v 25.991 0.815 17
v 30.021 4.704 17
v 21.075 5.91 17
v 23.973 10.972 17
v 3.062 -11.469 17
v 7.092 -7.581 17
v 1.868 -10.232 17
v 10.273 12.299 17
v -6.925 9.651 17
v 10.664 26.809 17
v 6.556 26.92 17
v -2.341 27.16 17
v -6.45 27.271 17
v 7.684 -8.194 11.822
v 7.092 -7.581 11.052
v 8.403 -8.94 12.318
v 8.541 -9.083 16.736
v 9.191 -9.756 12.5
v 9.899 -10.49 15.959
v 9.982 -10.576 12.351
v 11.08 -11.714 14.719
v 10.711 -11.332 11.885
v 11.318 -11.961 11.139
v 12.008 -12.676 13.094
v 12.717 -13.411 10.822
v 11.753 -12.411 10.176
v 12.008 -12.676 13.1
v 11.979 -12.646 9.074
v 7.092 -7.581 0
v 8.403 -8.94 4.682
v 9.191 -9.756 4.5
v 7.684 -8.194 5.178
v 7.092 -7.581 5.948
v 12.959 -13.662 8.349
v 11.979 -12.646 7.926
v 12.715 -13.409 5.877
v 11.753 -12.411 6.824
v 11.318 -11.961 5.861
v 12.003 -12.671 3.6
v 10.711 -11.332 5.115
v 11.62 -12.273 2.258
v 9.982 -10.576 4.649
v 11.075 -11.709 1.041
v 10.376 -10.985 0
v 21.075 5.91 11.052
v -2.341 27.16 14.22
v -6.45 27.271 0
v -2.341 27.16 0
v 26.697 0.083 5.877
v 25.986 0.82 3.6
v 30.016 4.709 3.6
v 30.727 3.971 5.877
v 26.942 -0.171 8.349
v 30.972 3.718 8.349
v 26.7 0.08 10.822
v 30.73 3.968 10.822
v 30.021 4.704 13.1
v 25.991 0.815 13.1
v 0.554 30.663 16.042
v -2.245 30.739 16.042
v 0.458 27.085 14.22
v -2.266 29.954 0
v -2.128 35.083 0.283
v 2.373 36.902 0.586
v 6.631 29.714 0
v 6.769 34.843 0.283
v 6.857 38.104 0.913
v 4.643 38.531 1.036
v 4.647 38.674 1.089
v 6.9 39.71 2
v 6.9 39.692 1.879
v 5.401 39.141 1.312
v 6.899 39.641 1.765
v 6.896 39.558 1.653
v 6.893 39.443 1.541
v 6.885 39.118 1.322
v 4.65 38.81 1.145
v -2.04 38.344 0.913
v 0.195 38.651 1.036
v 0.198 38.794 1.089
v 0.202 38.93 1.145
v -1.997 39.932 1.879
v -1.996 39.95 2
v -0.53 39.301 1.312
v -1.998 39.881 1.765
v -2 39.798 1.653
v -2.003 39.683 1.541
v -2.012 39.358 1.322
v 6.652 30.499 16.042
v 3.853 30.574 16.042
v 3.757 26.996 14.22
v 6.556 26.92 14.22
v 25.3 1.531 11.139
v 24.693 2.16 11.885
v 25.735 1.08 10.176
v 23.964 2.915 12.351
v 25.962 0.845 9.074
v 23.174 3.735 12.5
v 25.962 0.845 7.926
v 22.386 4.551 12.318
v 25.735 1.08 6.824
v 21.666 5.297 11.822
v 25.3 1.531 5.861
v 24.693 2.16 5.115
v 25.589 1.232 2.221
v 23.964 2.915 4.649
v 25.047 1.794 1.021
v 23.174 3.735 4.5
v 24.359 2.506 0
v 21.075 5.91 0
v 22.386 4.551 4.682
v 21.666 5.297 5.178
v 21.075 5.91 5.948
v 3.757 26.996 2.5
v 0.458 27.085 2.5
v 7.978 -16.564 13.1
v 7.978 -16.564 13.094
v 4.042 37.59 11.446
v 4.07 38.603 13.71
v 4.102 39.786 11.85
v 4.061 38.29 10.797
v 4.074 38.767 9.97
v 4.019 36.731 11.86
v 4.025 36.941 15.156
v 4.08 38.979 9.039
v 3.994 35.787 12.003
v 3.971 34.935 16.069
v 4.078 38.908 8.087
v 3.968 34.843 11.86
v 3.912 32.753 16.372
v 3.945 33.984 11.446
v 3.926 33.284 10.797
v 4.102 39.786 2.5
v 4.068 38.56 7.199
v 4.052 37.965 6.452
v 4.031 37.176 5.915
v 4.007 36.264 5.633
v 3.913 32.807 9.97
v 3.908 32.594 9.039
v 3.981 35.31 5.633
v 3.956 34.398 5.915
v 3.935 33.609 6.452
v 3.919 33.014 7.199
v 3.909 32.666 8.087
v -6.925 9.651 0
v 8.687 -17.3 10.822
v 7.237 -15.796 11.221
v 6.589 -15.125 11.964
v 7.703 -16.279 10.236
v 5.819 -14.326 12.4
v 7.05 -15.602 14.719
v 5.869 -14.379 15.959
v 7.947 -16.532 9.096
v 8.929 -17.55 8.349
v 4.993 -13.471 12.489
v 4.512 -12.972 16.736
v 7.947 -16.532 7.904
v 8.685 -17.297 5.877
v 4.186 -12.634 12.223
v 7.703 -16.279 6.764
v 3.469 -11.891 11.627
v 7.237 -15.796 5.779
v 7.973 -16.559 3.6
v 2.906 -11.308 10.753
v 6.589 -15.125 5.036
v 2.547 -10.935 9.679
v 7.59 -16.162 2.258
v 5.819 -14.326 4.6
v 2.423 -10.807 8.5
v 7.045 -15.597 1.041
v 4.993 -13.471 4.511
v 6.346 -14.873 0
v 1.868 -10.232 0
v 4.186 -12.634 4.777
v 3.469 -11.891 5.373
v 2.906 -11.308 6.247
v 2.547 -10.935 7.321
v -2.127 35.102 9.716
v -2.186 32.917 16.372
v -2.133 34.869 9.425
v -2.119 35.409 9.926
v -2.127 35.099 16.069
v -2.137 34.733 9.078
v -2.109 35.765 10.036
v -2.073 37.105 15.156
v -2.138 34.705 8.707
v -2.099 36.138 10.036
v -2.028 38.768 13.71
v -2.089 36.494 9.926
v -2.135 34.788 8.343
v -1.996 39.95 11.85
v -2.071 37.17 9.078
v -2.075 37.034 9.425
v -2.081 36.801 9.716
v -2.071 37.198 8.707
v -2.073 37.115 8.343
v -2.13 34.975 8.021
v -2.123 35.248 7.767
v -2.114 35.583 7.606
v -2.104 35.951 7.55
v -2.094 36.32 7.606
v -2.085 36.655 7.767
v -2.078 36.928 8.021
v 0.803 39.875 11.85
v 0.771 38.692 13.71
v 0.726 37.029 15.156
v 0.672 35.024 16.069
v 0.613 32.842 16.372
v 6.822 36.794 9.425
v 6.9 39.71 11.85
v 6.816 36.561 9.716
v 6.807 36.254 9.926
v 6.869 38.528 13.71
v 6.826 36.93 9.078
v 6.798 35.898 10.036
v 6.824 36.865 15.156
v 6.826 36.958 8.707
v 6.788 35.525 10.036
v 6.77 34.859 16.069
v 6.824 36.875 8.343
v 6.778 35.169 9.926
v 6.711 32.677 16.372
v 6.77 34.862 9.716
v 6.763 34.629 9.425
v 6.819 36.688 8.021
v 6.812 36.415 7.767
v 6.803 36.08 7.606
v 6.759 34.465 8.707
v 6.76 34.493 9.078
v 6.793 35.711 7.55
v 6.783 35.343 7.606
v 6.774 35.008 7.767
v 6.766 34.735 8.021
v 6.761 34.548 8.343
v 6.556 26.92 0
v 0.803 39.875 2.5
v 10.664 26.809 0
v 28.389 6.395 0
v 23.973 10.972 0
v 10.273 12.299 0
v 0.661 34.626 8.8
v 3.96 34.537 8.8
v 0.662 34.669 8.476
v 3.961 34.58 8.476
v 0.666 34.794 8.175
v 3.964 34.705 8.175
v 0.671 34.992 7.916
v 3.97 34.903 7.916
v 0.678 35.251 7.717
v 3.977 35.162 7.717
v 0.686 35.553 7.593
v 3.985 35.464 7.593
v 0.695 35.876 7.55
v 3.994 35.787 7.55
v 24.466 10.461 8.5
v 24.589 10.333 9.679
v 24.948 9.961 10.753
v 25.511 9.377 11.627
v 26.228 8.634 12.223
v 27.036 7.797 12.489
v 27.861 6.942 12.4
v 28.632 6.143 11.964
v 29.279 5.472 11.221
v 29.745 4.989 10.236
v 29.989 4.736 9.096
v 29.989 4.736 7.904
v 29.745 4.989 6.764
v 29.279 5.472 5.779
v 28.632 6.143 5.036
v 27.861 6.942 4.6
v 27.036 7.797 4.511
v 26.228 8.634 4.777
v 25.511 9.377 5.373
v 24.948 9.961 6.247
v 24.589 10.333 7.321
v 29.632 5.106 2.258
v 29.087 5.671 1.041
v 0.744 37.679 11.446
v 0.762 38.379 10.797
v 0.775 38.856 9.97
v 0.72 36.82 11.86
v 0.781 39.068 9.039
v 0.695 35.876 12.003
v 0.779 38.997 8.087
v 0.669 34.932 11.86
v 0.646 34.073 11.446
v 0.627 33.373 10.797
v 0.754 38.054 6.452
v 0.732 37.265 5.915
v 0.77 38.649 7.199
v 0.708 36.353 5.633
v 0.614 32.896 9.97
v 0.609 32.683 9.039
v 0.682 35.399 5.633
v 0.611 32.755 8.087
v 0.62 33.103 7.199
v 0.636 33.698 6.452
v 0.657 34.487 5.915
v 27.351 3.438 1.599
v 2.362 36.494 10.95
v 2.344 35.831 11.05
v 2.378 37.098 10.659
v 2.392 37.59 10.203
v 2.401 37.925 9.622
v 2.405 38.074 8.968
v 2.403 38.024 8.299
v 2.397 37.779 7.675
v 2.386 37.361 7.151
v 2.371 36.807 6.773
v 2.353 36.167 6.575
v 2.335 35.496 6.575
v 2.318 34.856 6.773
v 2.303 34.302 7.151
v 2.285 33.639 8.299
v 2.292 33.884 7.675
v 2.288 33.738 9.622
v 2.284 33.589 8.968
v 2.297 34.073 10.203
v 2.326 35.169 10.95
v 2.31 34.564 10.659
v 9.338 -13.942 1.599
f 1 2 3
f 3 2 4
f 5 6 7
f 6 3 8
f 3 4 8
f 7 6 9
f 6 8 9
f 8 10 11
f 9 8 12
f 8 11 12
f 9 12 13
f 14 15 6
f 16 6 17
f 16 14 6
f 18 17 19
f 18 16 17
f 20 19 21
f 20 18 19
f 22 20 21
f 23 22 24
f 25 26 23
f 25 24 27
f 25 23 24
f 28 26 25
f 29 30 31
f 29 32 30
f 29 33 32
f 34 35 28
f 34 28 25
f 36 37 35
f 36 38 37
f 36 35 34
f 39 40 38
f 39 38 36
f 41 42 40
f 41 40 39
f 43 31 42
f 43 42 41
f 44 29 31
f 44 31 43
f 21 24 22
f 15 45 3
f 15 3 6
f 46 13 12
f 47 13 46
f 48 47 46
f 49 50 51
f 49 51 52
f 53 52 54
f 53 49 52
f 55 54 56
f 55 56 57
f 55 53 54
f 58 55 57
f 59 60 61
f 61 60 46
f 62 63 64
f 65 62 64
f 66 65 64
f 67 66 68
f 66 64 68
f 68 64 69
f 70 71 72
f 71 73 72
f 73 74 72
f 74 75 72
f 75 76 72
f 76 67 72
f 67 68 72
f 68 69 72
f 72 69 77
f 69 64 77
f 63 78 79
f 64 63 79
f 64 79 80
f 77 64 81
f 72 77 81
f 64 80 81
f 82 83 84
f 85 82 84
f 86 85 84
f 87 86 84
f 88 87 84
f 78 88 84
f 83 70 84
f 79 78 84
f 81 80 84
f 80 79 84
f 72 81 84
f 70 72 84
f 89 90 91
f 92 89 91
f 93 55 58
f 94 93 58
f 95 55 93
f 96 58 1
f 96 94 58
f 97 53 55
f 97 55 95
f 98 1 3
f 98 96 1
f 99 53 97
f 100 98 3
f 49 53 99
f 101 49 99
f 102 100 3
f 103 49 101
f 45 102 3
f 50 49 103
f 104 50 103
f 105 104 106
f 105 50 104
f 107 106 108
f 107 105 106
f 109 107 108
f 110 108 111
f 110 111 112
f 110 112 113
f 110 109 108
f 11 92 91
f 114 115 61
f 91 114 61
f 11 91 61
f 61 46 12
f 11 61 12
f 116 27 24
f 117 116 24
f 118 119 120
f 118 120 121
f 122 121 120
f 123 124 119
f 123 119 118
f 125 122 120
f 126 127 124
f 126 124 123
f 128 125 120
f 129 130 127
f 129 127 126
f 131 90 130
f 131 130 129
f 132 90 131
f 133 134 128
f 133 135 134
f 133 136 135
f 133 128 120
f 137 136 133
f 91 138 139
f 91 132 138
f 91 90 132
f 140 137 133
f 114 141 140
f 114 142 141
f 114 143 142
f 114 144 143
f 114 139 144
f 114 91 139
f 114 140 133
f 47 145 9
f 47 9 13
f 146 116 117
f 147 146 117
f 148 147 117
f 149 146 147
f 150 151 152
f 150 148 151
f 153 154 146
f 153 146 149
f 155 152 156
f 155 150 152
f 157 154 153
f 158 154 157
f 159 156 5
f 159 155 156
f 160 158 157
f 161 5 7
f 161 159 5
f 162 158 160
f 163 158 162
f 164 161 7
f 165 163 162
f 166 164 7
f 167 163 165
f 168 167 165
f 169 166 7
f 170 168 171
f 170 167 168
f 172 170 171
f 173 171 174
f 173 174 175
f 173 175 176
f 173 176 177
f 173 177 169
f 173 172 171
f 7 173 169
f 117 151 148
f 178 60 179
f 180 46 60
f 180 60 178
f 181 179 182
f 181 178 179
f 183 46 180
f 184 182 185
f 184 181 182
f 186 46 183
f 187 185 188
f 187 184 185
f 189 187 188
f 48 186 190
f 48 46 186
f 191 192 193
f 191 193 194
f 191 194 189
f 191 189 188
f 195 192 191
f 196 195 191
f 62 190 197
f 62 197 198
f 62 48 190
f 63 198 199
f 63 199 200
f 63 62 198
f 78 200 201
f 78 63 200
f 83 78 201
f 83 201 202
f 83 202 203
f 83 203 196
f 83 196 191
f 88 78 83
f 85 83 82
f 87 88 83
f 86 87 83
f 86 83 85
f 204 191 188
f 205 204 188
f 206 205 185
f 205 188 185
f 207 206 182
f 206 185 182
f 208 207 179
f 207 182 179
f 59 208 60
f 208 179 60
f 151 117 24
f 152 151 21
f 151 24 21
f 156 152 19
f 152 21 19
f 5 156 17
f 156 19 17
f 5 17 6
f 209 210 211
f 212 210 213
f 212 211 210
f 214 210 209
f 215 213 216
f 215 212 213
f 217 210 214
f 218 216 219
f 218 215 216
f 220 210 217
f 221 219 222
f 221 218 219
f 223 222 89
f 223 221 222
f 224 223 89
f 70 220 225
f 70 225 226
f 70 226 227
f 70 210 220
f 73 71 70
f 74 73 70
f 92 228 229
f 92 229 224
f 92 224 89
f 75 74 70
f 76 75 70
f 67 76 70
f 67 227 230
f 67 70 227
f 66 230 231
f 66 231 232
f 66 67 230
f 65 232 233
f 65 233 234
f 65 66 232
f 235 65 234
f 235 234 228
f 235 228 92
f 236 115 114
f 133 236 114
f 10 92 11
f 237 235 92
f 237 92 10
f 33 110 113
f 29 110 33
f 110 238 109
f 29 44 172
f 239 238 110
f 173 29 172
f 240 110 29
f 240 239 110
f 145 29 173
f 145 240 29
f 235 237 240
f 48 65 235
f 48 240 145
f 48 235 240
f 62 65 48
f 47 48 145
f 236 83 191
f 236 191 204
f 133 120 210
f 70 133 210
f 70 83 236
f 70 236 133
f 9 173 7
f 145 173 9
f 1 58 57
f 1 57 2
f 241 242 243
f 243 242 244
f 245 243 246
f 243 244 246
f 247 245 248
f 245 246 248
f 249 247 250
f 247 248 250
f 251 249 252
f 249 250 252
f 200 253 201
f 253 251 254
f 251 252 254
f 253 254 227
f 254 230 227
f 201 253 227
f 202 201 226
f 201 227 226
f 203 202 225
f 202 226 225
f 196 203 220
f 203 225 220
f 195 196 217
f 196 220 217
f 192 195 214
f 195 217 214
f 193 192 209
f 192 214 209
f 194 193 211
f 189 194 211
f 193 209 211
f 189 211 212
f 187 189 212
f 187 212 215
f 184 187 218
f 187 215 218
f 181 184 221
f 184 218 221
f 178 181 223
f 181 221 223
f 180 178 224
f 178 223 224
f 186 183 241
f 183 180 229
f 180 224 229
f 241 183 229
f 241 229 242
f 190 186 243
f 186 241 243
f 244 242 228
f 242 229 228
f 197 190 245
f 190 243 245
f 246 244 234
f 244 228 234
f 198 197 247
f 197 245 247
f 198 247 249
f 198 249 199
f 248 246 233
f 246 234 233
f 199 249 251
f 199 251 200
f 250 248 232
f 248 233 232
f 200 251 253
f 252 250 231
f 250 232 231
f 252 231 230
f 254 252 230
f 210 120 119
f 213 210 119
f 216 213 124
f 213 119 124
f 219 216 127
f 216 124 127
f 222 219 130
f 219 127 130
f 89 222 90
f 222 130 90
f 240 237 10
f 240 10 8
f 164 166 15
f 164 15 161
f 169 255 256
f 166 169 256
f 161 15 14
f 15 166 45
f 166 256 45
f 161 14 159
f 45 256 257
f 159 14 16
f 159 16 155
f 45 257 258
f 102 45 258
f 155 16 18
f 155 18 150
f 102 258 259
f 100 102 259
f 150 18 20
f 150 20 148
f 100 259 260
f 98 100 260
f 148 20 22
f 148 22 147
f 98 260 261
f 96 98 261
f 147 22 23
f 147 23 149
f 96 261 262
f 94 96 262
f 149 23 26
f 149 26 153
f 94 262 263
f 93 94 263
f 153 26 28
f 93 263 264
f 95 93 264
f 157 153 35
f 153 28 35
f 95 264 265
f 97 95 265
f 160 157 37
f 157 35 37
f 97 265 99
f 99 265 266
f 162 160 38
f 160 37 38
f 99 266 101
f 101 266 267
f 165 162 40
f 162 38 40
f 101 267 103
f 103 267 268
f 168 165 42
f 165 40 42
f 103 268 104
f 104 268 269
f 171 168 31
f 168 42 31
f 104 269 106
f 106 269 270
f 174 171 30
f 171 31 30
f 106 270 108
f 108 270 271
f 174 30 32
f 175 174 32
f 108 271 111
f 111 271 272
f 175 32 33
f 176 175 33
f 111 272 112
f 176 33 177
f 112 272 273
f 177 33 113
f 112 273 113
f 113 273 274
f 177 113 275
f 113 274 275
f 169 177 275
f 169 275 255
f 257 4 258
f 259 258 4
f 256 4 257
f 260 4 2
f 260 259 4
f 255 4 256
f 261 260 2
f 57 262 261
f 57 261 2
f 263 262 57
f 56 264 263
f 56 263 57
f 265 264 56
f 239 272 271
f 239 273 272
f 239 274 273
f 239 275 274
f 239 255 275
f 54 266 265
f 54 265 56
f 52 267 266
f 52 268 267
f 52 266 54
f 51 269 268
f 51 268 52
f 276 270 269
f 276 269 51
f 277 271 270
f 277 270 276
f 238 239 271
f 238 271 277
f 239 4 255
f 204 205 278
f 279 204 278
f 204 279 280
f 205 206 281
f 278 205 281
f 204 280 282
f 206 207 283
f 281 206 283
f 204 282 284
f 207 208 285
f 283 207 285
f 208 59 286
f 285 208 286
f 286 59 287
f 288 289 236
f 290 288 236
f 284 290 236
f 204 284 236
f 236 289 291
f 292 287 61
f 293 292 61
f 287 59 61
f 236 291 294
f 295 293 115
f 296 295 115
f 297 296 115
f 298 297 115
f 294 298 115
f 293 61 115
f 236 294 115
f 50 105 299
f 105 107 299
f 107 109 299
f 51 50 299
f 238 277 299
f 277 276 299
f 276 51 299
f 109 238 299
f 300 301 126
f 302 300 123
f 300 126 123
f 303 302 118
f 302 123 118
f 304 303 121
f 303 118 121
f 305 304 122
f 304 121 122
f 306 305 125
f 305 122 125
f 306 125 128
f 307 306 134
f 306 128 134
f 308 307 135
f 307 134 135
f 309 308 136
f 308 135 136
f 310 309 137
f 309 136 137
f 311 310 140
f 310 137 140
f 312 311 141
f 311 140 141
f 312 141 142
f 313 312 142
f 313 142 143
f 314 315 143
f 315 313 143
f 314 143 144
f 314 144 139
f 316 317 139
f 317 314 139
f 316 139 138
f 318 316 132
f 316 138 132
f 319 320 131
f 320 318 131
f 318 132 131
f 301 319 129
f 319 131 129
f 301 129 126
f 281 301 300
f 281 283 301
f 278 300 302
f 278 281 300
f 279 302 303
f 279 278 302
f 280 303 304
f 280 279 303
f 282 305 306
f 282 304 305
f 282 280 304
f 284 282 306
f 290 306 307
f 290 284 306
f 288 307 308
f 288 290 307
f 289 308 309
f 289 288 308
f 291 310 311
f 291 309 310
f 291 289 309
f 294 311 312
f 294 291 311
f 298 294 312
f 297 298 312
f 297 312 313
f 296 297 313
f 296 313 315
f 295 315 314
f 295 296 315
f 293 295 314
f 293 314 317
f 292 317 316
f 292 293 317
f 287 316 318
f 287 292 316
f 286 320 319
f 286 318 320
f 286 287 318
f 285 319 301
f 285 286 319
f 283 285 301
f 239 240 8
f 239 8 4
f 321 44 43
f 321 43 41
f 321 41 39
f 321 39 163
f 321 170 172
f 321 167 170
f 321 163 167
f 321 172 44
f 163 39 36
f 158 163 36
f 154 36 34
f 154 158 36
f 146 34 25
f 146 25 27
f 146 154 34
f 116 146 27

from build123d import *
from build123d.topology import SkipClean

# Parameters (mm, degrees)
BOSS_EXTRUDE1_DEPTH            = 17
CUT_EXTRUDE1_DEPTH             = 12
CUT_EXTRUDE2_DEPTH             = 35
CUT_EXTRUDE4_DEPTH             = 70
SKETCH8_R                      = 4
CUT_EXTRUDE5_DEPTH             = 47.01609876
CUT_EXTRUDE6_START             = -12.794651
SKETCH9_W                      = 3.3
SKETCH9_H                      = 13.87251724
CUT_EXTRUDE6_DEPTH             = 12.794651
F_2_5_2_5_DIAMETER_HOLE1_D     = 2.5
F_2_5_2_5_DIAMETER_HOLE1_DEPTH = 10
F_2_5_2_5_DIAMETER_HOLE1_TIP   = 0.751075774
SKETCH12_R                     = 2.25
SKETCH12_R_2                   = 1.25
EXTRUDE_THIN1_DEPTH            = 1.65
EXTRUDE_THIN1_TAPER            = -30
EXTRUDE_THIN1_OTHER_WAY_DEPTH  = 1.65
EXTRUDE_THIN1_OTHER_WAY_TAPER  = -30
SKETCH13_R                     = 1.25
CUT_EXTRUDE7_DEPTH             = 51.298409268
FILLET1_SIZE                   = 10
FILLET1_SIZE_2                 = 2


with BuildPart() as part:
    # Sketch1 → Boss-Extrude1 (new body)
    with BuildSketch(Plane.XY):
        Polygon((9.214105344, -17.845408642), (1.867831272, -10.231693567), (-6.924981548, 9.65081238), (-6.44974452, 27.27081238), (-2.341238634, 27.16), (-1.996273731, 39.95), (6.90049084, 39.710041319), (6.555525937, 26.920041319), (10.664031823, 26.80922894), (10.272676019, 12.29922894), (23.972676019, 10.97162784), (31.256458157, 3.422679717), (27.22651445, -0.465707315), (21.07453068, 5.910239336), (7.092065282, -7.581074959), (13.244049051, -13.95702161), align=None)
    extrude(amount=BOSS_EXTRUDE1_DEPTH)

    # Sketch3 → Cut-Extrude1 (cut)
    with BuildSketch(Plane(origin=(-3.071548911, 0.082844142, 0), x_dir=(0, 0, 1), z_dir=(-0.9996364686497187, 0.026961649532627044, 0))):
        with BuildLine():
            Line((0, 41.347002833), (0, 39.88165409))
            Line((0, 39.88165409), (11.85, 39.88165409))
            ThreePointArc((11.85, 39.88165409), (15.684994113, 36.06545508), (16.041740609, 30.667002833))
            Line((16.041740609, 30.667002833), (14.22, 27.087002833))
            Line((14.22, 27.087002833), (17.68, 27.087002833))
            Line((17.68, 27.087002833), (17.68, 41.347002833))
            Line((17.68, 41.347002833), (0, 41.347002833))
        make_face()
    extrude(amount=-CUT_EXTRUDE1_DEPTH, mode=Mode.SUBTRACT)

    # Sketch4 → Cut-Extrude2 (cut, symmetric)
    with BuildSketch(Plane(origin=(13.867127573, 13.38002785, 0), x_dir=(0, 0, 1), z_dir=(-0.7196328048525186, -0.6943548272894032, 0))):
        with BuildLine():
            Line((-2.314754212, -10.38), (0, -10.38))
            Line((0, -10.38), (0, -15.11))
            add(Edge.make_bspline(
                [(3.6, -17.452900819), (1.397081859, -16.752692527), (0, -15.11)],
                knots=[0, 0, 0, 1, 1, 1], degree=2))
            ThreePointArc((3.6, -17.452900819), (8.348973573, -18.829997515), (13.1, -17.46))
            Line((13.1, -17.46), (17, -17.46))
            Line((17, -17.46), (17, -10.38))
            Line((17, -10.38), (19.895245788, -10.38))
            Line((19.895245788, -10.38), (19.895245788, -23.53))
            Line((19.895245788, -23.53), (-2.314754212, -23.53))
            Line((-2.314754212, -23.53), (-2.314754212, -10.38))
        make_face()
    extrude(amount=CUT_EXTRUDE2_DEPTH, both=True, mode=Mode.SUBTRACT)

    # Sketch7 → Cut-Extrude4 (cut)
    with BuildSketch(Plane(origin=(-0.115337826, -0.111286444, 0), x_dir=(0, 0, -1), z_dir=(0.7196328048525139, 0.6943548272894081, 0))):
        with BuildLine():
            Line((-17, -17.46), (-13.094358857, -17.46))
            ThreePointArc((-13.094358857, -17.46), (-15.958832909, -14.422908382), (-17, -10.38))
            Line((-17, -10.38), (-17, -17.46))
        make_face()
    extrude(amount=-CUT_EXTRUDE4_DEPTH, mode=Mode.SUBTRACT)

    # Sketch8 → Cut-Extrude5 (cut, through all)
    with BuildSketch(Plane(origin=(17.89707128, 17.268414883, 0), x_dir=(0, 0, -1), z_dir=(0.7196328048525137, 0.6943548272894083, 0))):
        with Locations(Location((-8.5, -13.46, 0), (0, 0, 90))):
            Circle(SKETCH8_R)
    extrude(amount=-CUT_EXTRUDE5_DEPTH, mode=Mode.SUBTRACT)

    # Sketch9 → Cut-Extrude6 (cut)
    with SkipClean():  # the faces are left unmerged after this step: merging them gives an invalid solid
        with BuildSketch(Plane(origin=(1.07527518, 39.867155858, 0), x_dir=(0.9996364686497184, -0.026961649532630364, 0), z_dir=(0.026961649532630364, 0.9996364686497184, 0)).offset(CUT_EXTRUDE6_START)):
            with Locations((1.377334079, -9.43625862)):
                Rectangle(SKETCH9_W, SKETCH9_H)
        extrude(amount=CUT_EXTRUDE6_DEPTH, mode=Mode.SUBTRACT)

    # Ø2.5 (2.5) Diameter Hole1
    with Locations(Plane(origin=(-3.071548911, 0.082844142, 0), x_dir=(0, 0, 1), z_dir=(-0.9996364686497187, 0.026961649532627044, 0))):
        with Locations((8.8, 35.88165409)):
            Hole(F_2_5_2_5_DIAMETER_HOLE1_D / 2, depth=F_2_5_2_5_DIAMETER_HOLE1_DEPTH)
            with Locations((0, 0, -(F_2_5_2_5_DIAMETER_HOLE1_DEPTH + F_2_5_2_5_DIAMETER_HOLE1_TIP / 2))):  # 118° drill point
                Cone(0, F_2_5_2_5_DIAMETER_HOLE1_D / 2, F_2_5_2_5_DIAMETER_HOLE1_TIP, mode=Mode.SUBTRACT)

    # Sketch12 → Extrude-Thin1 (add)
    with SkipClean():  # the faces are left unmerged after this step: merging them gives an invalid solid
        with BuildSketch(Plane(origin=(1.376833375, -0.037135199, 0), x_dir=(0, 0, 1), z_dir=(-0.9996364686497184, 0.02696164953263036, 0))):
            with Locations((8.8, 35.88165409)):
                Circle(SKETCH12_R)
            with Locations((8.8, 35.88165409)):
                Circle(SKETCH12_R_2, mode=Mode.SUBTRACT)
        extrude(amount=-EXTRUDE_THIN1_DEPTH, taper=EXTRUDE_THIN1_TAPER)

    # Sketch12 → Extrude-Thin1 other way (add)
    with SkipClean():  # the faces are left unmerged after this step: merging them gives an invalid solid
        with BuildSketch(Plane(origin=(1.376833375, -0.037135199, 0), x_dir=(0, 0, 1), z_dir=(-0.9996364686497184, 0.02696164953263036, 0))):
            with Locations((8.8, 35.88165409)):
                Circle(SKETCH12_R)
            with Locations((8.8, 35.88165409)):
                Circle(SKETCH12_R_2, mode=Mode.SUBTRACT)
        extrude(amount=EXTRUDE_THIN1_OTHER_WAY_DEPTH, taper=EXTRUDE_THIN1_OTHER_WAY_TAPER)

    # Sketch13 → Cut-Extrude7 (cut, through all)
    with SkipClean():  # the faces are left unmerged after this step: merging them gives an invalid solid
        with BuildSketch(Plane(origin=(5.82521566, -0.157114539, 0), x_dir=(0, 0, -1), z_dir=(0.9996364686497184, -0.02696164953263123, 0))):
            with Locations(Location((-8.8, 35.88165409, 0), (0, 0, 270))):
                Circle(SKETCH13_R)
        extrude(amount=-CUT_EXTRUDE7_DEPTH, mode=Mode.SUBTRACT)

    # Fillet1
    # an asymmetric fillet: 10, 2 mm, written as the material it takes off along each edge
    with BuildSketch(Plane(origin=(-26.987185447, 40.624041238, 0), x_dir=(-0.02696164953263108, -0.9996364686497184, 0), z_dir=(0.9996364686497184, -0.02696164953263108, 0))) as fillet1_piece_1:
        with BuildLine():
            Bezier((FILLET1_SIZE, 0), (0, 0), (0, -FILLET1_SIZE_2), weights=[1, 0.707106781, 1])
            Line((0, -FILLET1_SIZE_2), (0, 0))
            Line((0, 0), (FILLET1_SIZE, 0))
        make_face()
    extrude(amount=58.9, mode=Mode.SUBTRACT)


solid = part.part
